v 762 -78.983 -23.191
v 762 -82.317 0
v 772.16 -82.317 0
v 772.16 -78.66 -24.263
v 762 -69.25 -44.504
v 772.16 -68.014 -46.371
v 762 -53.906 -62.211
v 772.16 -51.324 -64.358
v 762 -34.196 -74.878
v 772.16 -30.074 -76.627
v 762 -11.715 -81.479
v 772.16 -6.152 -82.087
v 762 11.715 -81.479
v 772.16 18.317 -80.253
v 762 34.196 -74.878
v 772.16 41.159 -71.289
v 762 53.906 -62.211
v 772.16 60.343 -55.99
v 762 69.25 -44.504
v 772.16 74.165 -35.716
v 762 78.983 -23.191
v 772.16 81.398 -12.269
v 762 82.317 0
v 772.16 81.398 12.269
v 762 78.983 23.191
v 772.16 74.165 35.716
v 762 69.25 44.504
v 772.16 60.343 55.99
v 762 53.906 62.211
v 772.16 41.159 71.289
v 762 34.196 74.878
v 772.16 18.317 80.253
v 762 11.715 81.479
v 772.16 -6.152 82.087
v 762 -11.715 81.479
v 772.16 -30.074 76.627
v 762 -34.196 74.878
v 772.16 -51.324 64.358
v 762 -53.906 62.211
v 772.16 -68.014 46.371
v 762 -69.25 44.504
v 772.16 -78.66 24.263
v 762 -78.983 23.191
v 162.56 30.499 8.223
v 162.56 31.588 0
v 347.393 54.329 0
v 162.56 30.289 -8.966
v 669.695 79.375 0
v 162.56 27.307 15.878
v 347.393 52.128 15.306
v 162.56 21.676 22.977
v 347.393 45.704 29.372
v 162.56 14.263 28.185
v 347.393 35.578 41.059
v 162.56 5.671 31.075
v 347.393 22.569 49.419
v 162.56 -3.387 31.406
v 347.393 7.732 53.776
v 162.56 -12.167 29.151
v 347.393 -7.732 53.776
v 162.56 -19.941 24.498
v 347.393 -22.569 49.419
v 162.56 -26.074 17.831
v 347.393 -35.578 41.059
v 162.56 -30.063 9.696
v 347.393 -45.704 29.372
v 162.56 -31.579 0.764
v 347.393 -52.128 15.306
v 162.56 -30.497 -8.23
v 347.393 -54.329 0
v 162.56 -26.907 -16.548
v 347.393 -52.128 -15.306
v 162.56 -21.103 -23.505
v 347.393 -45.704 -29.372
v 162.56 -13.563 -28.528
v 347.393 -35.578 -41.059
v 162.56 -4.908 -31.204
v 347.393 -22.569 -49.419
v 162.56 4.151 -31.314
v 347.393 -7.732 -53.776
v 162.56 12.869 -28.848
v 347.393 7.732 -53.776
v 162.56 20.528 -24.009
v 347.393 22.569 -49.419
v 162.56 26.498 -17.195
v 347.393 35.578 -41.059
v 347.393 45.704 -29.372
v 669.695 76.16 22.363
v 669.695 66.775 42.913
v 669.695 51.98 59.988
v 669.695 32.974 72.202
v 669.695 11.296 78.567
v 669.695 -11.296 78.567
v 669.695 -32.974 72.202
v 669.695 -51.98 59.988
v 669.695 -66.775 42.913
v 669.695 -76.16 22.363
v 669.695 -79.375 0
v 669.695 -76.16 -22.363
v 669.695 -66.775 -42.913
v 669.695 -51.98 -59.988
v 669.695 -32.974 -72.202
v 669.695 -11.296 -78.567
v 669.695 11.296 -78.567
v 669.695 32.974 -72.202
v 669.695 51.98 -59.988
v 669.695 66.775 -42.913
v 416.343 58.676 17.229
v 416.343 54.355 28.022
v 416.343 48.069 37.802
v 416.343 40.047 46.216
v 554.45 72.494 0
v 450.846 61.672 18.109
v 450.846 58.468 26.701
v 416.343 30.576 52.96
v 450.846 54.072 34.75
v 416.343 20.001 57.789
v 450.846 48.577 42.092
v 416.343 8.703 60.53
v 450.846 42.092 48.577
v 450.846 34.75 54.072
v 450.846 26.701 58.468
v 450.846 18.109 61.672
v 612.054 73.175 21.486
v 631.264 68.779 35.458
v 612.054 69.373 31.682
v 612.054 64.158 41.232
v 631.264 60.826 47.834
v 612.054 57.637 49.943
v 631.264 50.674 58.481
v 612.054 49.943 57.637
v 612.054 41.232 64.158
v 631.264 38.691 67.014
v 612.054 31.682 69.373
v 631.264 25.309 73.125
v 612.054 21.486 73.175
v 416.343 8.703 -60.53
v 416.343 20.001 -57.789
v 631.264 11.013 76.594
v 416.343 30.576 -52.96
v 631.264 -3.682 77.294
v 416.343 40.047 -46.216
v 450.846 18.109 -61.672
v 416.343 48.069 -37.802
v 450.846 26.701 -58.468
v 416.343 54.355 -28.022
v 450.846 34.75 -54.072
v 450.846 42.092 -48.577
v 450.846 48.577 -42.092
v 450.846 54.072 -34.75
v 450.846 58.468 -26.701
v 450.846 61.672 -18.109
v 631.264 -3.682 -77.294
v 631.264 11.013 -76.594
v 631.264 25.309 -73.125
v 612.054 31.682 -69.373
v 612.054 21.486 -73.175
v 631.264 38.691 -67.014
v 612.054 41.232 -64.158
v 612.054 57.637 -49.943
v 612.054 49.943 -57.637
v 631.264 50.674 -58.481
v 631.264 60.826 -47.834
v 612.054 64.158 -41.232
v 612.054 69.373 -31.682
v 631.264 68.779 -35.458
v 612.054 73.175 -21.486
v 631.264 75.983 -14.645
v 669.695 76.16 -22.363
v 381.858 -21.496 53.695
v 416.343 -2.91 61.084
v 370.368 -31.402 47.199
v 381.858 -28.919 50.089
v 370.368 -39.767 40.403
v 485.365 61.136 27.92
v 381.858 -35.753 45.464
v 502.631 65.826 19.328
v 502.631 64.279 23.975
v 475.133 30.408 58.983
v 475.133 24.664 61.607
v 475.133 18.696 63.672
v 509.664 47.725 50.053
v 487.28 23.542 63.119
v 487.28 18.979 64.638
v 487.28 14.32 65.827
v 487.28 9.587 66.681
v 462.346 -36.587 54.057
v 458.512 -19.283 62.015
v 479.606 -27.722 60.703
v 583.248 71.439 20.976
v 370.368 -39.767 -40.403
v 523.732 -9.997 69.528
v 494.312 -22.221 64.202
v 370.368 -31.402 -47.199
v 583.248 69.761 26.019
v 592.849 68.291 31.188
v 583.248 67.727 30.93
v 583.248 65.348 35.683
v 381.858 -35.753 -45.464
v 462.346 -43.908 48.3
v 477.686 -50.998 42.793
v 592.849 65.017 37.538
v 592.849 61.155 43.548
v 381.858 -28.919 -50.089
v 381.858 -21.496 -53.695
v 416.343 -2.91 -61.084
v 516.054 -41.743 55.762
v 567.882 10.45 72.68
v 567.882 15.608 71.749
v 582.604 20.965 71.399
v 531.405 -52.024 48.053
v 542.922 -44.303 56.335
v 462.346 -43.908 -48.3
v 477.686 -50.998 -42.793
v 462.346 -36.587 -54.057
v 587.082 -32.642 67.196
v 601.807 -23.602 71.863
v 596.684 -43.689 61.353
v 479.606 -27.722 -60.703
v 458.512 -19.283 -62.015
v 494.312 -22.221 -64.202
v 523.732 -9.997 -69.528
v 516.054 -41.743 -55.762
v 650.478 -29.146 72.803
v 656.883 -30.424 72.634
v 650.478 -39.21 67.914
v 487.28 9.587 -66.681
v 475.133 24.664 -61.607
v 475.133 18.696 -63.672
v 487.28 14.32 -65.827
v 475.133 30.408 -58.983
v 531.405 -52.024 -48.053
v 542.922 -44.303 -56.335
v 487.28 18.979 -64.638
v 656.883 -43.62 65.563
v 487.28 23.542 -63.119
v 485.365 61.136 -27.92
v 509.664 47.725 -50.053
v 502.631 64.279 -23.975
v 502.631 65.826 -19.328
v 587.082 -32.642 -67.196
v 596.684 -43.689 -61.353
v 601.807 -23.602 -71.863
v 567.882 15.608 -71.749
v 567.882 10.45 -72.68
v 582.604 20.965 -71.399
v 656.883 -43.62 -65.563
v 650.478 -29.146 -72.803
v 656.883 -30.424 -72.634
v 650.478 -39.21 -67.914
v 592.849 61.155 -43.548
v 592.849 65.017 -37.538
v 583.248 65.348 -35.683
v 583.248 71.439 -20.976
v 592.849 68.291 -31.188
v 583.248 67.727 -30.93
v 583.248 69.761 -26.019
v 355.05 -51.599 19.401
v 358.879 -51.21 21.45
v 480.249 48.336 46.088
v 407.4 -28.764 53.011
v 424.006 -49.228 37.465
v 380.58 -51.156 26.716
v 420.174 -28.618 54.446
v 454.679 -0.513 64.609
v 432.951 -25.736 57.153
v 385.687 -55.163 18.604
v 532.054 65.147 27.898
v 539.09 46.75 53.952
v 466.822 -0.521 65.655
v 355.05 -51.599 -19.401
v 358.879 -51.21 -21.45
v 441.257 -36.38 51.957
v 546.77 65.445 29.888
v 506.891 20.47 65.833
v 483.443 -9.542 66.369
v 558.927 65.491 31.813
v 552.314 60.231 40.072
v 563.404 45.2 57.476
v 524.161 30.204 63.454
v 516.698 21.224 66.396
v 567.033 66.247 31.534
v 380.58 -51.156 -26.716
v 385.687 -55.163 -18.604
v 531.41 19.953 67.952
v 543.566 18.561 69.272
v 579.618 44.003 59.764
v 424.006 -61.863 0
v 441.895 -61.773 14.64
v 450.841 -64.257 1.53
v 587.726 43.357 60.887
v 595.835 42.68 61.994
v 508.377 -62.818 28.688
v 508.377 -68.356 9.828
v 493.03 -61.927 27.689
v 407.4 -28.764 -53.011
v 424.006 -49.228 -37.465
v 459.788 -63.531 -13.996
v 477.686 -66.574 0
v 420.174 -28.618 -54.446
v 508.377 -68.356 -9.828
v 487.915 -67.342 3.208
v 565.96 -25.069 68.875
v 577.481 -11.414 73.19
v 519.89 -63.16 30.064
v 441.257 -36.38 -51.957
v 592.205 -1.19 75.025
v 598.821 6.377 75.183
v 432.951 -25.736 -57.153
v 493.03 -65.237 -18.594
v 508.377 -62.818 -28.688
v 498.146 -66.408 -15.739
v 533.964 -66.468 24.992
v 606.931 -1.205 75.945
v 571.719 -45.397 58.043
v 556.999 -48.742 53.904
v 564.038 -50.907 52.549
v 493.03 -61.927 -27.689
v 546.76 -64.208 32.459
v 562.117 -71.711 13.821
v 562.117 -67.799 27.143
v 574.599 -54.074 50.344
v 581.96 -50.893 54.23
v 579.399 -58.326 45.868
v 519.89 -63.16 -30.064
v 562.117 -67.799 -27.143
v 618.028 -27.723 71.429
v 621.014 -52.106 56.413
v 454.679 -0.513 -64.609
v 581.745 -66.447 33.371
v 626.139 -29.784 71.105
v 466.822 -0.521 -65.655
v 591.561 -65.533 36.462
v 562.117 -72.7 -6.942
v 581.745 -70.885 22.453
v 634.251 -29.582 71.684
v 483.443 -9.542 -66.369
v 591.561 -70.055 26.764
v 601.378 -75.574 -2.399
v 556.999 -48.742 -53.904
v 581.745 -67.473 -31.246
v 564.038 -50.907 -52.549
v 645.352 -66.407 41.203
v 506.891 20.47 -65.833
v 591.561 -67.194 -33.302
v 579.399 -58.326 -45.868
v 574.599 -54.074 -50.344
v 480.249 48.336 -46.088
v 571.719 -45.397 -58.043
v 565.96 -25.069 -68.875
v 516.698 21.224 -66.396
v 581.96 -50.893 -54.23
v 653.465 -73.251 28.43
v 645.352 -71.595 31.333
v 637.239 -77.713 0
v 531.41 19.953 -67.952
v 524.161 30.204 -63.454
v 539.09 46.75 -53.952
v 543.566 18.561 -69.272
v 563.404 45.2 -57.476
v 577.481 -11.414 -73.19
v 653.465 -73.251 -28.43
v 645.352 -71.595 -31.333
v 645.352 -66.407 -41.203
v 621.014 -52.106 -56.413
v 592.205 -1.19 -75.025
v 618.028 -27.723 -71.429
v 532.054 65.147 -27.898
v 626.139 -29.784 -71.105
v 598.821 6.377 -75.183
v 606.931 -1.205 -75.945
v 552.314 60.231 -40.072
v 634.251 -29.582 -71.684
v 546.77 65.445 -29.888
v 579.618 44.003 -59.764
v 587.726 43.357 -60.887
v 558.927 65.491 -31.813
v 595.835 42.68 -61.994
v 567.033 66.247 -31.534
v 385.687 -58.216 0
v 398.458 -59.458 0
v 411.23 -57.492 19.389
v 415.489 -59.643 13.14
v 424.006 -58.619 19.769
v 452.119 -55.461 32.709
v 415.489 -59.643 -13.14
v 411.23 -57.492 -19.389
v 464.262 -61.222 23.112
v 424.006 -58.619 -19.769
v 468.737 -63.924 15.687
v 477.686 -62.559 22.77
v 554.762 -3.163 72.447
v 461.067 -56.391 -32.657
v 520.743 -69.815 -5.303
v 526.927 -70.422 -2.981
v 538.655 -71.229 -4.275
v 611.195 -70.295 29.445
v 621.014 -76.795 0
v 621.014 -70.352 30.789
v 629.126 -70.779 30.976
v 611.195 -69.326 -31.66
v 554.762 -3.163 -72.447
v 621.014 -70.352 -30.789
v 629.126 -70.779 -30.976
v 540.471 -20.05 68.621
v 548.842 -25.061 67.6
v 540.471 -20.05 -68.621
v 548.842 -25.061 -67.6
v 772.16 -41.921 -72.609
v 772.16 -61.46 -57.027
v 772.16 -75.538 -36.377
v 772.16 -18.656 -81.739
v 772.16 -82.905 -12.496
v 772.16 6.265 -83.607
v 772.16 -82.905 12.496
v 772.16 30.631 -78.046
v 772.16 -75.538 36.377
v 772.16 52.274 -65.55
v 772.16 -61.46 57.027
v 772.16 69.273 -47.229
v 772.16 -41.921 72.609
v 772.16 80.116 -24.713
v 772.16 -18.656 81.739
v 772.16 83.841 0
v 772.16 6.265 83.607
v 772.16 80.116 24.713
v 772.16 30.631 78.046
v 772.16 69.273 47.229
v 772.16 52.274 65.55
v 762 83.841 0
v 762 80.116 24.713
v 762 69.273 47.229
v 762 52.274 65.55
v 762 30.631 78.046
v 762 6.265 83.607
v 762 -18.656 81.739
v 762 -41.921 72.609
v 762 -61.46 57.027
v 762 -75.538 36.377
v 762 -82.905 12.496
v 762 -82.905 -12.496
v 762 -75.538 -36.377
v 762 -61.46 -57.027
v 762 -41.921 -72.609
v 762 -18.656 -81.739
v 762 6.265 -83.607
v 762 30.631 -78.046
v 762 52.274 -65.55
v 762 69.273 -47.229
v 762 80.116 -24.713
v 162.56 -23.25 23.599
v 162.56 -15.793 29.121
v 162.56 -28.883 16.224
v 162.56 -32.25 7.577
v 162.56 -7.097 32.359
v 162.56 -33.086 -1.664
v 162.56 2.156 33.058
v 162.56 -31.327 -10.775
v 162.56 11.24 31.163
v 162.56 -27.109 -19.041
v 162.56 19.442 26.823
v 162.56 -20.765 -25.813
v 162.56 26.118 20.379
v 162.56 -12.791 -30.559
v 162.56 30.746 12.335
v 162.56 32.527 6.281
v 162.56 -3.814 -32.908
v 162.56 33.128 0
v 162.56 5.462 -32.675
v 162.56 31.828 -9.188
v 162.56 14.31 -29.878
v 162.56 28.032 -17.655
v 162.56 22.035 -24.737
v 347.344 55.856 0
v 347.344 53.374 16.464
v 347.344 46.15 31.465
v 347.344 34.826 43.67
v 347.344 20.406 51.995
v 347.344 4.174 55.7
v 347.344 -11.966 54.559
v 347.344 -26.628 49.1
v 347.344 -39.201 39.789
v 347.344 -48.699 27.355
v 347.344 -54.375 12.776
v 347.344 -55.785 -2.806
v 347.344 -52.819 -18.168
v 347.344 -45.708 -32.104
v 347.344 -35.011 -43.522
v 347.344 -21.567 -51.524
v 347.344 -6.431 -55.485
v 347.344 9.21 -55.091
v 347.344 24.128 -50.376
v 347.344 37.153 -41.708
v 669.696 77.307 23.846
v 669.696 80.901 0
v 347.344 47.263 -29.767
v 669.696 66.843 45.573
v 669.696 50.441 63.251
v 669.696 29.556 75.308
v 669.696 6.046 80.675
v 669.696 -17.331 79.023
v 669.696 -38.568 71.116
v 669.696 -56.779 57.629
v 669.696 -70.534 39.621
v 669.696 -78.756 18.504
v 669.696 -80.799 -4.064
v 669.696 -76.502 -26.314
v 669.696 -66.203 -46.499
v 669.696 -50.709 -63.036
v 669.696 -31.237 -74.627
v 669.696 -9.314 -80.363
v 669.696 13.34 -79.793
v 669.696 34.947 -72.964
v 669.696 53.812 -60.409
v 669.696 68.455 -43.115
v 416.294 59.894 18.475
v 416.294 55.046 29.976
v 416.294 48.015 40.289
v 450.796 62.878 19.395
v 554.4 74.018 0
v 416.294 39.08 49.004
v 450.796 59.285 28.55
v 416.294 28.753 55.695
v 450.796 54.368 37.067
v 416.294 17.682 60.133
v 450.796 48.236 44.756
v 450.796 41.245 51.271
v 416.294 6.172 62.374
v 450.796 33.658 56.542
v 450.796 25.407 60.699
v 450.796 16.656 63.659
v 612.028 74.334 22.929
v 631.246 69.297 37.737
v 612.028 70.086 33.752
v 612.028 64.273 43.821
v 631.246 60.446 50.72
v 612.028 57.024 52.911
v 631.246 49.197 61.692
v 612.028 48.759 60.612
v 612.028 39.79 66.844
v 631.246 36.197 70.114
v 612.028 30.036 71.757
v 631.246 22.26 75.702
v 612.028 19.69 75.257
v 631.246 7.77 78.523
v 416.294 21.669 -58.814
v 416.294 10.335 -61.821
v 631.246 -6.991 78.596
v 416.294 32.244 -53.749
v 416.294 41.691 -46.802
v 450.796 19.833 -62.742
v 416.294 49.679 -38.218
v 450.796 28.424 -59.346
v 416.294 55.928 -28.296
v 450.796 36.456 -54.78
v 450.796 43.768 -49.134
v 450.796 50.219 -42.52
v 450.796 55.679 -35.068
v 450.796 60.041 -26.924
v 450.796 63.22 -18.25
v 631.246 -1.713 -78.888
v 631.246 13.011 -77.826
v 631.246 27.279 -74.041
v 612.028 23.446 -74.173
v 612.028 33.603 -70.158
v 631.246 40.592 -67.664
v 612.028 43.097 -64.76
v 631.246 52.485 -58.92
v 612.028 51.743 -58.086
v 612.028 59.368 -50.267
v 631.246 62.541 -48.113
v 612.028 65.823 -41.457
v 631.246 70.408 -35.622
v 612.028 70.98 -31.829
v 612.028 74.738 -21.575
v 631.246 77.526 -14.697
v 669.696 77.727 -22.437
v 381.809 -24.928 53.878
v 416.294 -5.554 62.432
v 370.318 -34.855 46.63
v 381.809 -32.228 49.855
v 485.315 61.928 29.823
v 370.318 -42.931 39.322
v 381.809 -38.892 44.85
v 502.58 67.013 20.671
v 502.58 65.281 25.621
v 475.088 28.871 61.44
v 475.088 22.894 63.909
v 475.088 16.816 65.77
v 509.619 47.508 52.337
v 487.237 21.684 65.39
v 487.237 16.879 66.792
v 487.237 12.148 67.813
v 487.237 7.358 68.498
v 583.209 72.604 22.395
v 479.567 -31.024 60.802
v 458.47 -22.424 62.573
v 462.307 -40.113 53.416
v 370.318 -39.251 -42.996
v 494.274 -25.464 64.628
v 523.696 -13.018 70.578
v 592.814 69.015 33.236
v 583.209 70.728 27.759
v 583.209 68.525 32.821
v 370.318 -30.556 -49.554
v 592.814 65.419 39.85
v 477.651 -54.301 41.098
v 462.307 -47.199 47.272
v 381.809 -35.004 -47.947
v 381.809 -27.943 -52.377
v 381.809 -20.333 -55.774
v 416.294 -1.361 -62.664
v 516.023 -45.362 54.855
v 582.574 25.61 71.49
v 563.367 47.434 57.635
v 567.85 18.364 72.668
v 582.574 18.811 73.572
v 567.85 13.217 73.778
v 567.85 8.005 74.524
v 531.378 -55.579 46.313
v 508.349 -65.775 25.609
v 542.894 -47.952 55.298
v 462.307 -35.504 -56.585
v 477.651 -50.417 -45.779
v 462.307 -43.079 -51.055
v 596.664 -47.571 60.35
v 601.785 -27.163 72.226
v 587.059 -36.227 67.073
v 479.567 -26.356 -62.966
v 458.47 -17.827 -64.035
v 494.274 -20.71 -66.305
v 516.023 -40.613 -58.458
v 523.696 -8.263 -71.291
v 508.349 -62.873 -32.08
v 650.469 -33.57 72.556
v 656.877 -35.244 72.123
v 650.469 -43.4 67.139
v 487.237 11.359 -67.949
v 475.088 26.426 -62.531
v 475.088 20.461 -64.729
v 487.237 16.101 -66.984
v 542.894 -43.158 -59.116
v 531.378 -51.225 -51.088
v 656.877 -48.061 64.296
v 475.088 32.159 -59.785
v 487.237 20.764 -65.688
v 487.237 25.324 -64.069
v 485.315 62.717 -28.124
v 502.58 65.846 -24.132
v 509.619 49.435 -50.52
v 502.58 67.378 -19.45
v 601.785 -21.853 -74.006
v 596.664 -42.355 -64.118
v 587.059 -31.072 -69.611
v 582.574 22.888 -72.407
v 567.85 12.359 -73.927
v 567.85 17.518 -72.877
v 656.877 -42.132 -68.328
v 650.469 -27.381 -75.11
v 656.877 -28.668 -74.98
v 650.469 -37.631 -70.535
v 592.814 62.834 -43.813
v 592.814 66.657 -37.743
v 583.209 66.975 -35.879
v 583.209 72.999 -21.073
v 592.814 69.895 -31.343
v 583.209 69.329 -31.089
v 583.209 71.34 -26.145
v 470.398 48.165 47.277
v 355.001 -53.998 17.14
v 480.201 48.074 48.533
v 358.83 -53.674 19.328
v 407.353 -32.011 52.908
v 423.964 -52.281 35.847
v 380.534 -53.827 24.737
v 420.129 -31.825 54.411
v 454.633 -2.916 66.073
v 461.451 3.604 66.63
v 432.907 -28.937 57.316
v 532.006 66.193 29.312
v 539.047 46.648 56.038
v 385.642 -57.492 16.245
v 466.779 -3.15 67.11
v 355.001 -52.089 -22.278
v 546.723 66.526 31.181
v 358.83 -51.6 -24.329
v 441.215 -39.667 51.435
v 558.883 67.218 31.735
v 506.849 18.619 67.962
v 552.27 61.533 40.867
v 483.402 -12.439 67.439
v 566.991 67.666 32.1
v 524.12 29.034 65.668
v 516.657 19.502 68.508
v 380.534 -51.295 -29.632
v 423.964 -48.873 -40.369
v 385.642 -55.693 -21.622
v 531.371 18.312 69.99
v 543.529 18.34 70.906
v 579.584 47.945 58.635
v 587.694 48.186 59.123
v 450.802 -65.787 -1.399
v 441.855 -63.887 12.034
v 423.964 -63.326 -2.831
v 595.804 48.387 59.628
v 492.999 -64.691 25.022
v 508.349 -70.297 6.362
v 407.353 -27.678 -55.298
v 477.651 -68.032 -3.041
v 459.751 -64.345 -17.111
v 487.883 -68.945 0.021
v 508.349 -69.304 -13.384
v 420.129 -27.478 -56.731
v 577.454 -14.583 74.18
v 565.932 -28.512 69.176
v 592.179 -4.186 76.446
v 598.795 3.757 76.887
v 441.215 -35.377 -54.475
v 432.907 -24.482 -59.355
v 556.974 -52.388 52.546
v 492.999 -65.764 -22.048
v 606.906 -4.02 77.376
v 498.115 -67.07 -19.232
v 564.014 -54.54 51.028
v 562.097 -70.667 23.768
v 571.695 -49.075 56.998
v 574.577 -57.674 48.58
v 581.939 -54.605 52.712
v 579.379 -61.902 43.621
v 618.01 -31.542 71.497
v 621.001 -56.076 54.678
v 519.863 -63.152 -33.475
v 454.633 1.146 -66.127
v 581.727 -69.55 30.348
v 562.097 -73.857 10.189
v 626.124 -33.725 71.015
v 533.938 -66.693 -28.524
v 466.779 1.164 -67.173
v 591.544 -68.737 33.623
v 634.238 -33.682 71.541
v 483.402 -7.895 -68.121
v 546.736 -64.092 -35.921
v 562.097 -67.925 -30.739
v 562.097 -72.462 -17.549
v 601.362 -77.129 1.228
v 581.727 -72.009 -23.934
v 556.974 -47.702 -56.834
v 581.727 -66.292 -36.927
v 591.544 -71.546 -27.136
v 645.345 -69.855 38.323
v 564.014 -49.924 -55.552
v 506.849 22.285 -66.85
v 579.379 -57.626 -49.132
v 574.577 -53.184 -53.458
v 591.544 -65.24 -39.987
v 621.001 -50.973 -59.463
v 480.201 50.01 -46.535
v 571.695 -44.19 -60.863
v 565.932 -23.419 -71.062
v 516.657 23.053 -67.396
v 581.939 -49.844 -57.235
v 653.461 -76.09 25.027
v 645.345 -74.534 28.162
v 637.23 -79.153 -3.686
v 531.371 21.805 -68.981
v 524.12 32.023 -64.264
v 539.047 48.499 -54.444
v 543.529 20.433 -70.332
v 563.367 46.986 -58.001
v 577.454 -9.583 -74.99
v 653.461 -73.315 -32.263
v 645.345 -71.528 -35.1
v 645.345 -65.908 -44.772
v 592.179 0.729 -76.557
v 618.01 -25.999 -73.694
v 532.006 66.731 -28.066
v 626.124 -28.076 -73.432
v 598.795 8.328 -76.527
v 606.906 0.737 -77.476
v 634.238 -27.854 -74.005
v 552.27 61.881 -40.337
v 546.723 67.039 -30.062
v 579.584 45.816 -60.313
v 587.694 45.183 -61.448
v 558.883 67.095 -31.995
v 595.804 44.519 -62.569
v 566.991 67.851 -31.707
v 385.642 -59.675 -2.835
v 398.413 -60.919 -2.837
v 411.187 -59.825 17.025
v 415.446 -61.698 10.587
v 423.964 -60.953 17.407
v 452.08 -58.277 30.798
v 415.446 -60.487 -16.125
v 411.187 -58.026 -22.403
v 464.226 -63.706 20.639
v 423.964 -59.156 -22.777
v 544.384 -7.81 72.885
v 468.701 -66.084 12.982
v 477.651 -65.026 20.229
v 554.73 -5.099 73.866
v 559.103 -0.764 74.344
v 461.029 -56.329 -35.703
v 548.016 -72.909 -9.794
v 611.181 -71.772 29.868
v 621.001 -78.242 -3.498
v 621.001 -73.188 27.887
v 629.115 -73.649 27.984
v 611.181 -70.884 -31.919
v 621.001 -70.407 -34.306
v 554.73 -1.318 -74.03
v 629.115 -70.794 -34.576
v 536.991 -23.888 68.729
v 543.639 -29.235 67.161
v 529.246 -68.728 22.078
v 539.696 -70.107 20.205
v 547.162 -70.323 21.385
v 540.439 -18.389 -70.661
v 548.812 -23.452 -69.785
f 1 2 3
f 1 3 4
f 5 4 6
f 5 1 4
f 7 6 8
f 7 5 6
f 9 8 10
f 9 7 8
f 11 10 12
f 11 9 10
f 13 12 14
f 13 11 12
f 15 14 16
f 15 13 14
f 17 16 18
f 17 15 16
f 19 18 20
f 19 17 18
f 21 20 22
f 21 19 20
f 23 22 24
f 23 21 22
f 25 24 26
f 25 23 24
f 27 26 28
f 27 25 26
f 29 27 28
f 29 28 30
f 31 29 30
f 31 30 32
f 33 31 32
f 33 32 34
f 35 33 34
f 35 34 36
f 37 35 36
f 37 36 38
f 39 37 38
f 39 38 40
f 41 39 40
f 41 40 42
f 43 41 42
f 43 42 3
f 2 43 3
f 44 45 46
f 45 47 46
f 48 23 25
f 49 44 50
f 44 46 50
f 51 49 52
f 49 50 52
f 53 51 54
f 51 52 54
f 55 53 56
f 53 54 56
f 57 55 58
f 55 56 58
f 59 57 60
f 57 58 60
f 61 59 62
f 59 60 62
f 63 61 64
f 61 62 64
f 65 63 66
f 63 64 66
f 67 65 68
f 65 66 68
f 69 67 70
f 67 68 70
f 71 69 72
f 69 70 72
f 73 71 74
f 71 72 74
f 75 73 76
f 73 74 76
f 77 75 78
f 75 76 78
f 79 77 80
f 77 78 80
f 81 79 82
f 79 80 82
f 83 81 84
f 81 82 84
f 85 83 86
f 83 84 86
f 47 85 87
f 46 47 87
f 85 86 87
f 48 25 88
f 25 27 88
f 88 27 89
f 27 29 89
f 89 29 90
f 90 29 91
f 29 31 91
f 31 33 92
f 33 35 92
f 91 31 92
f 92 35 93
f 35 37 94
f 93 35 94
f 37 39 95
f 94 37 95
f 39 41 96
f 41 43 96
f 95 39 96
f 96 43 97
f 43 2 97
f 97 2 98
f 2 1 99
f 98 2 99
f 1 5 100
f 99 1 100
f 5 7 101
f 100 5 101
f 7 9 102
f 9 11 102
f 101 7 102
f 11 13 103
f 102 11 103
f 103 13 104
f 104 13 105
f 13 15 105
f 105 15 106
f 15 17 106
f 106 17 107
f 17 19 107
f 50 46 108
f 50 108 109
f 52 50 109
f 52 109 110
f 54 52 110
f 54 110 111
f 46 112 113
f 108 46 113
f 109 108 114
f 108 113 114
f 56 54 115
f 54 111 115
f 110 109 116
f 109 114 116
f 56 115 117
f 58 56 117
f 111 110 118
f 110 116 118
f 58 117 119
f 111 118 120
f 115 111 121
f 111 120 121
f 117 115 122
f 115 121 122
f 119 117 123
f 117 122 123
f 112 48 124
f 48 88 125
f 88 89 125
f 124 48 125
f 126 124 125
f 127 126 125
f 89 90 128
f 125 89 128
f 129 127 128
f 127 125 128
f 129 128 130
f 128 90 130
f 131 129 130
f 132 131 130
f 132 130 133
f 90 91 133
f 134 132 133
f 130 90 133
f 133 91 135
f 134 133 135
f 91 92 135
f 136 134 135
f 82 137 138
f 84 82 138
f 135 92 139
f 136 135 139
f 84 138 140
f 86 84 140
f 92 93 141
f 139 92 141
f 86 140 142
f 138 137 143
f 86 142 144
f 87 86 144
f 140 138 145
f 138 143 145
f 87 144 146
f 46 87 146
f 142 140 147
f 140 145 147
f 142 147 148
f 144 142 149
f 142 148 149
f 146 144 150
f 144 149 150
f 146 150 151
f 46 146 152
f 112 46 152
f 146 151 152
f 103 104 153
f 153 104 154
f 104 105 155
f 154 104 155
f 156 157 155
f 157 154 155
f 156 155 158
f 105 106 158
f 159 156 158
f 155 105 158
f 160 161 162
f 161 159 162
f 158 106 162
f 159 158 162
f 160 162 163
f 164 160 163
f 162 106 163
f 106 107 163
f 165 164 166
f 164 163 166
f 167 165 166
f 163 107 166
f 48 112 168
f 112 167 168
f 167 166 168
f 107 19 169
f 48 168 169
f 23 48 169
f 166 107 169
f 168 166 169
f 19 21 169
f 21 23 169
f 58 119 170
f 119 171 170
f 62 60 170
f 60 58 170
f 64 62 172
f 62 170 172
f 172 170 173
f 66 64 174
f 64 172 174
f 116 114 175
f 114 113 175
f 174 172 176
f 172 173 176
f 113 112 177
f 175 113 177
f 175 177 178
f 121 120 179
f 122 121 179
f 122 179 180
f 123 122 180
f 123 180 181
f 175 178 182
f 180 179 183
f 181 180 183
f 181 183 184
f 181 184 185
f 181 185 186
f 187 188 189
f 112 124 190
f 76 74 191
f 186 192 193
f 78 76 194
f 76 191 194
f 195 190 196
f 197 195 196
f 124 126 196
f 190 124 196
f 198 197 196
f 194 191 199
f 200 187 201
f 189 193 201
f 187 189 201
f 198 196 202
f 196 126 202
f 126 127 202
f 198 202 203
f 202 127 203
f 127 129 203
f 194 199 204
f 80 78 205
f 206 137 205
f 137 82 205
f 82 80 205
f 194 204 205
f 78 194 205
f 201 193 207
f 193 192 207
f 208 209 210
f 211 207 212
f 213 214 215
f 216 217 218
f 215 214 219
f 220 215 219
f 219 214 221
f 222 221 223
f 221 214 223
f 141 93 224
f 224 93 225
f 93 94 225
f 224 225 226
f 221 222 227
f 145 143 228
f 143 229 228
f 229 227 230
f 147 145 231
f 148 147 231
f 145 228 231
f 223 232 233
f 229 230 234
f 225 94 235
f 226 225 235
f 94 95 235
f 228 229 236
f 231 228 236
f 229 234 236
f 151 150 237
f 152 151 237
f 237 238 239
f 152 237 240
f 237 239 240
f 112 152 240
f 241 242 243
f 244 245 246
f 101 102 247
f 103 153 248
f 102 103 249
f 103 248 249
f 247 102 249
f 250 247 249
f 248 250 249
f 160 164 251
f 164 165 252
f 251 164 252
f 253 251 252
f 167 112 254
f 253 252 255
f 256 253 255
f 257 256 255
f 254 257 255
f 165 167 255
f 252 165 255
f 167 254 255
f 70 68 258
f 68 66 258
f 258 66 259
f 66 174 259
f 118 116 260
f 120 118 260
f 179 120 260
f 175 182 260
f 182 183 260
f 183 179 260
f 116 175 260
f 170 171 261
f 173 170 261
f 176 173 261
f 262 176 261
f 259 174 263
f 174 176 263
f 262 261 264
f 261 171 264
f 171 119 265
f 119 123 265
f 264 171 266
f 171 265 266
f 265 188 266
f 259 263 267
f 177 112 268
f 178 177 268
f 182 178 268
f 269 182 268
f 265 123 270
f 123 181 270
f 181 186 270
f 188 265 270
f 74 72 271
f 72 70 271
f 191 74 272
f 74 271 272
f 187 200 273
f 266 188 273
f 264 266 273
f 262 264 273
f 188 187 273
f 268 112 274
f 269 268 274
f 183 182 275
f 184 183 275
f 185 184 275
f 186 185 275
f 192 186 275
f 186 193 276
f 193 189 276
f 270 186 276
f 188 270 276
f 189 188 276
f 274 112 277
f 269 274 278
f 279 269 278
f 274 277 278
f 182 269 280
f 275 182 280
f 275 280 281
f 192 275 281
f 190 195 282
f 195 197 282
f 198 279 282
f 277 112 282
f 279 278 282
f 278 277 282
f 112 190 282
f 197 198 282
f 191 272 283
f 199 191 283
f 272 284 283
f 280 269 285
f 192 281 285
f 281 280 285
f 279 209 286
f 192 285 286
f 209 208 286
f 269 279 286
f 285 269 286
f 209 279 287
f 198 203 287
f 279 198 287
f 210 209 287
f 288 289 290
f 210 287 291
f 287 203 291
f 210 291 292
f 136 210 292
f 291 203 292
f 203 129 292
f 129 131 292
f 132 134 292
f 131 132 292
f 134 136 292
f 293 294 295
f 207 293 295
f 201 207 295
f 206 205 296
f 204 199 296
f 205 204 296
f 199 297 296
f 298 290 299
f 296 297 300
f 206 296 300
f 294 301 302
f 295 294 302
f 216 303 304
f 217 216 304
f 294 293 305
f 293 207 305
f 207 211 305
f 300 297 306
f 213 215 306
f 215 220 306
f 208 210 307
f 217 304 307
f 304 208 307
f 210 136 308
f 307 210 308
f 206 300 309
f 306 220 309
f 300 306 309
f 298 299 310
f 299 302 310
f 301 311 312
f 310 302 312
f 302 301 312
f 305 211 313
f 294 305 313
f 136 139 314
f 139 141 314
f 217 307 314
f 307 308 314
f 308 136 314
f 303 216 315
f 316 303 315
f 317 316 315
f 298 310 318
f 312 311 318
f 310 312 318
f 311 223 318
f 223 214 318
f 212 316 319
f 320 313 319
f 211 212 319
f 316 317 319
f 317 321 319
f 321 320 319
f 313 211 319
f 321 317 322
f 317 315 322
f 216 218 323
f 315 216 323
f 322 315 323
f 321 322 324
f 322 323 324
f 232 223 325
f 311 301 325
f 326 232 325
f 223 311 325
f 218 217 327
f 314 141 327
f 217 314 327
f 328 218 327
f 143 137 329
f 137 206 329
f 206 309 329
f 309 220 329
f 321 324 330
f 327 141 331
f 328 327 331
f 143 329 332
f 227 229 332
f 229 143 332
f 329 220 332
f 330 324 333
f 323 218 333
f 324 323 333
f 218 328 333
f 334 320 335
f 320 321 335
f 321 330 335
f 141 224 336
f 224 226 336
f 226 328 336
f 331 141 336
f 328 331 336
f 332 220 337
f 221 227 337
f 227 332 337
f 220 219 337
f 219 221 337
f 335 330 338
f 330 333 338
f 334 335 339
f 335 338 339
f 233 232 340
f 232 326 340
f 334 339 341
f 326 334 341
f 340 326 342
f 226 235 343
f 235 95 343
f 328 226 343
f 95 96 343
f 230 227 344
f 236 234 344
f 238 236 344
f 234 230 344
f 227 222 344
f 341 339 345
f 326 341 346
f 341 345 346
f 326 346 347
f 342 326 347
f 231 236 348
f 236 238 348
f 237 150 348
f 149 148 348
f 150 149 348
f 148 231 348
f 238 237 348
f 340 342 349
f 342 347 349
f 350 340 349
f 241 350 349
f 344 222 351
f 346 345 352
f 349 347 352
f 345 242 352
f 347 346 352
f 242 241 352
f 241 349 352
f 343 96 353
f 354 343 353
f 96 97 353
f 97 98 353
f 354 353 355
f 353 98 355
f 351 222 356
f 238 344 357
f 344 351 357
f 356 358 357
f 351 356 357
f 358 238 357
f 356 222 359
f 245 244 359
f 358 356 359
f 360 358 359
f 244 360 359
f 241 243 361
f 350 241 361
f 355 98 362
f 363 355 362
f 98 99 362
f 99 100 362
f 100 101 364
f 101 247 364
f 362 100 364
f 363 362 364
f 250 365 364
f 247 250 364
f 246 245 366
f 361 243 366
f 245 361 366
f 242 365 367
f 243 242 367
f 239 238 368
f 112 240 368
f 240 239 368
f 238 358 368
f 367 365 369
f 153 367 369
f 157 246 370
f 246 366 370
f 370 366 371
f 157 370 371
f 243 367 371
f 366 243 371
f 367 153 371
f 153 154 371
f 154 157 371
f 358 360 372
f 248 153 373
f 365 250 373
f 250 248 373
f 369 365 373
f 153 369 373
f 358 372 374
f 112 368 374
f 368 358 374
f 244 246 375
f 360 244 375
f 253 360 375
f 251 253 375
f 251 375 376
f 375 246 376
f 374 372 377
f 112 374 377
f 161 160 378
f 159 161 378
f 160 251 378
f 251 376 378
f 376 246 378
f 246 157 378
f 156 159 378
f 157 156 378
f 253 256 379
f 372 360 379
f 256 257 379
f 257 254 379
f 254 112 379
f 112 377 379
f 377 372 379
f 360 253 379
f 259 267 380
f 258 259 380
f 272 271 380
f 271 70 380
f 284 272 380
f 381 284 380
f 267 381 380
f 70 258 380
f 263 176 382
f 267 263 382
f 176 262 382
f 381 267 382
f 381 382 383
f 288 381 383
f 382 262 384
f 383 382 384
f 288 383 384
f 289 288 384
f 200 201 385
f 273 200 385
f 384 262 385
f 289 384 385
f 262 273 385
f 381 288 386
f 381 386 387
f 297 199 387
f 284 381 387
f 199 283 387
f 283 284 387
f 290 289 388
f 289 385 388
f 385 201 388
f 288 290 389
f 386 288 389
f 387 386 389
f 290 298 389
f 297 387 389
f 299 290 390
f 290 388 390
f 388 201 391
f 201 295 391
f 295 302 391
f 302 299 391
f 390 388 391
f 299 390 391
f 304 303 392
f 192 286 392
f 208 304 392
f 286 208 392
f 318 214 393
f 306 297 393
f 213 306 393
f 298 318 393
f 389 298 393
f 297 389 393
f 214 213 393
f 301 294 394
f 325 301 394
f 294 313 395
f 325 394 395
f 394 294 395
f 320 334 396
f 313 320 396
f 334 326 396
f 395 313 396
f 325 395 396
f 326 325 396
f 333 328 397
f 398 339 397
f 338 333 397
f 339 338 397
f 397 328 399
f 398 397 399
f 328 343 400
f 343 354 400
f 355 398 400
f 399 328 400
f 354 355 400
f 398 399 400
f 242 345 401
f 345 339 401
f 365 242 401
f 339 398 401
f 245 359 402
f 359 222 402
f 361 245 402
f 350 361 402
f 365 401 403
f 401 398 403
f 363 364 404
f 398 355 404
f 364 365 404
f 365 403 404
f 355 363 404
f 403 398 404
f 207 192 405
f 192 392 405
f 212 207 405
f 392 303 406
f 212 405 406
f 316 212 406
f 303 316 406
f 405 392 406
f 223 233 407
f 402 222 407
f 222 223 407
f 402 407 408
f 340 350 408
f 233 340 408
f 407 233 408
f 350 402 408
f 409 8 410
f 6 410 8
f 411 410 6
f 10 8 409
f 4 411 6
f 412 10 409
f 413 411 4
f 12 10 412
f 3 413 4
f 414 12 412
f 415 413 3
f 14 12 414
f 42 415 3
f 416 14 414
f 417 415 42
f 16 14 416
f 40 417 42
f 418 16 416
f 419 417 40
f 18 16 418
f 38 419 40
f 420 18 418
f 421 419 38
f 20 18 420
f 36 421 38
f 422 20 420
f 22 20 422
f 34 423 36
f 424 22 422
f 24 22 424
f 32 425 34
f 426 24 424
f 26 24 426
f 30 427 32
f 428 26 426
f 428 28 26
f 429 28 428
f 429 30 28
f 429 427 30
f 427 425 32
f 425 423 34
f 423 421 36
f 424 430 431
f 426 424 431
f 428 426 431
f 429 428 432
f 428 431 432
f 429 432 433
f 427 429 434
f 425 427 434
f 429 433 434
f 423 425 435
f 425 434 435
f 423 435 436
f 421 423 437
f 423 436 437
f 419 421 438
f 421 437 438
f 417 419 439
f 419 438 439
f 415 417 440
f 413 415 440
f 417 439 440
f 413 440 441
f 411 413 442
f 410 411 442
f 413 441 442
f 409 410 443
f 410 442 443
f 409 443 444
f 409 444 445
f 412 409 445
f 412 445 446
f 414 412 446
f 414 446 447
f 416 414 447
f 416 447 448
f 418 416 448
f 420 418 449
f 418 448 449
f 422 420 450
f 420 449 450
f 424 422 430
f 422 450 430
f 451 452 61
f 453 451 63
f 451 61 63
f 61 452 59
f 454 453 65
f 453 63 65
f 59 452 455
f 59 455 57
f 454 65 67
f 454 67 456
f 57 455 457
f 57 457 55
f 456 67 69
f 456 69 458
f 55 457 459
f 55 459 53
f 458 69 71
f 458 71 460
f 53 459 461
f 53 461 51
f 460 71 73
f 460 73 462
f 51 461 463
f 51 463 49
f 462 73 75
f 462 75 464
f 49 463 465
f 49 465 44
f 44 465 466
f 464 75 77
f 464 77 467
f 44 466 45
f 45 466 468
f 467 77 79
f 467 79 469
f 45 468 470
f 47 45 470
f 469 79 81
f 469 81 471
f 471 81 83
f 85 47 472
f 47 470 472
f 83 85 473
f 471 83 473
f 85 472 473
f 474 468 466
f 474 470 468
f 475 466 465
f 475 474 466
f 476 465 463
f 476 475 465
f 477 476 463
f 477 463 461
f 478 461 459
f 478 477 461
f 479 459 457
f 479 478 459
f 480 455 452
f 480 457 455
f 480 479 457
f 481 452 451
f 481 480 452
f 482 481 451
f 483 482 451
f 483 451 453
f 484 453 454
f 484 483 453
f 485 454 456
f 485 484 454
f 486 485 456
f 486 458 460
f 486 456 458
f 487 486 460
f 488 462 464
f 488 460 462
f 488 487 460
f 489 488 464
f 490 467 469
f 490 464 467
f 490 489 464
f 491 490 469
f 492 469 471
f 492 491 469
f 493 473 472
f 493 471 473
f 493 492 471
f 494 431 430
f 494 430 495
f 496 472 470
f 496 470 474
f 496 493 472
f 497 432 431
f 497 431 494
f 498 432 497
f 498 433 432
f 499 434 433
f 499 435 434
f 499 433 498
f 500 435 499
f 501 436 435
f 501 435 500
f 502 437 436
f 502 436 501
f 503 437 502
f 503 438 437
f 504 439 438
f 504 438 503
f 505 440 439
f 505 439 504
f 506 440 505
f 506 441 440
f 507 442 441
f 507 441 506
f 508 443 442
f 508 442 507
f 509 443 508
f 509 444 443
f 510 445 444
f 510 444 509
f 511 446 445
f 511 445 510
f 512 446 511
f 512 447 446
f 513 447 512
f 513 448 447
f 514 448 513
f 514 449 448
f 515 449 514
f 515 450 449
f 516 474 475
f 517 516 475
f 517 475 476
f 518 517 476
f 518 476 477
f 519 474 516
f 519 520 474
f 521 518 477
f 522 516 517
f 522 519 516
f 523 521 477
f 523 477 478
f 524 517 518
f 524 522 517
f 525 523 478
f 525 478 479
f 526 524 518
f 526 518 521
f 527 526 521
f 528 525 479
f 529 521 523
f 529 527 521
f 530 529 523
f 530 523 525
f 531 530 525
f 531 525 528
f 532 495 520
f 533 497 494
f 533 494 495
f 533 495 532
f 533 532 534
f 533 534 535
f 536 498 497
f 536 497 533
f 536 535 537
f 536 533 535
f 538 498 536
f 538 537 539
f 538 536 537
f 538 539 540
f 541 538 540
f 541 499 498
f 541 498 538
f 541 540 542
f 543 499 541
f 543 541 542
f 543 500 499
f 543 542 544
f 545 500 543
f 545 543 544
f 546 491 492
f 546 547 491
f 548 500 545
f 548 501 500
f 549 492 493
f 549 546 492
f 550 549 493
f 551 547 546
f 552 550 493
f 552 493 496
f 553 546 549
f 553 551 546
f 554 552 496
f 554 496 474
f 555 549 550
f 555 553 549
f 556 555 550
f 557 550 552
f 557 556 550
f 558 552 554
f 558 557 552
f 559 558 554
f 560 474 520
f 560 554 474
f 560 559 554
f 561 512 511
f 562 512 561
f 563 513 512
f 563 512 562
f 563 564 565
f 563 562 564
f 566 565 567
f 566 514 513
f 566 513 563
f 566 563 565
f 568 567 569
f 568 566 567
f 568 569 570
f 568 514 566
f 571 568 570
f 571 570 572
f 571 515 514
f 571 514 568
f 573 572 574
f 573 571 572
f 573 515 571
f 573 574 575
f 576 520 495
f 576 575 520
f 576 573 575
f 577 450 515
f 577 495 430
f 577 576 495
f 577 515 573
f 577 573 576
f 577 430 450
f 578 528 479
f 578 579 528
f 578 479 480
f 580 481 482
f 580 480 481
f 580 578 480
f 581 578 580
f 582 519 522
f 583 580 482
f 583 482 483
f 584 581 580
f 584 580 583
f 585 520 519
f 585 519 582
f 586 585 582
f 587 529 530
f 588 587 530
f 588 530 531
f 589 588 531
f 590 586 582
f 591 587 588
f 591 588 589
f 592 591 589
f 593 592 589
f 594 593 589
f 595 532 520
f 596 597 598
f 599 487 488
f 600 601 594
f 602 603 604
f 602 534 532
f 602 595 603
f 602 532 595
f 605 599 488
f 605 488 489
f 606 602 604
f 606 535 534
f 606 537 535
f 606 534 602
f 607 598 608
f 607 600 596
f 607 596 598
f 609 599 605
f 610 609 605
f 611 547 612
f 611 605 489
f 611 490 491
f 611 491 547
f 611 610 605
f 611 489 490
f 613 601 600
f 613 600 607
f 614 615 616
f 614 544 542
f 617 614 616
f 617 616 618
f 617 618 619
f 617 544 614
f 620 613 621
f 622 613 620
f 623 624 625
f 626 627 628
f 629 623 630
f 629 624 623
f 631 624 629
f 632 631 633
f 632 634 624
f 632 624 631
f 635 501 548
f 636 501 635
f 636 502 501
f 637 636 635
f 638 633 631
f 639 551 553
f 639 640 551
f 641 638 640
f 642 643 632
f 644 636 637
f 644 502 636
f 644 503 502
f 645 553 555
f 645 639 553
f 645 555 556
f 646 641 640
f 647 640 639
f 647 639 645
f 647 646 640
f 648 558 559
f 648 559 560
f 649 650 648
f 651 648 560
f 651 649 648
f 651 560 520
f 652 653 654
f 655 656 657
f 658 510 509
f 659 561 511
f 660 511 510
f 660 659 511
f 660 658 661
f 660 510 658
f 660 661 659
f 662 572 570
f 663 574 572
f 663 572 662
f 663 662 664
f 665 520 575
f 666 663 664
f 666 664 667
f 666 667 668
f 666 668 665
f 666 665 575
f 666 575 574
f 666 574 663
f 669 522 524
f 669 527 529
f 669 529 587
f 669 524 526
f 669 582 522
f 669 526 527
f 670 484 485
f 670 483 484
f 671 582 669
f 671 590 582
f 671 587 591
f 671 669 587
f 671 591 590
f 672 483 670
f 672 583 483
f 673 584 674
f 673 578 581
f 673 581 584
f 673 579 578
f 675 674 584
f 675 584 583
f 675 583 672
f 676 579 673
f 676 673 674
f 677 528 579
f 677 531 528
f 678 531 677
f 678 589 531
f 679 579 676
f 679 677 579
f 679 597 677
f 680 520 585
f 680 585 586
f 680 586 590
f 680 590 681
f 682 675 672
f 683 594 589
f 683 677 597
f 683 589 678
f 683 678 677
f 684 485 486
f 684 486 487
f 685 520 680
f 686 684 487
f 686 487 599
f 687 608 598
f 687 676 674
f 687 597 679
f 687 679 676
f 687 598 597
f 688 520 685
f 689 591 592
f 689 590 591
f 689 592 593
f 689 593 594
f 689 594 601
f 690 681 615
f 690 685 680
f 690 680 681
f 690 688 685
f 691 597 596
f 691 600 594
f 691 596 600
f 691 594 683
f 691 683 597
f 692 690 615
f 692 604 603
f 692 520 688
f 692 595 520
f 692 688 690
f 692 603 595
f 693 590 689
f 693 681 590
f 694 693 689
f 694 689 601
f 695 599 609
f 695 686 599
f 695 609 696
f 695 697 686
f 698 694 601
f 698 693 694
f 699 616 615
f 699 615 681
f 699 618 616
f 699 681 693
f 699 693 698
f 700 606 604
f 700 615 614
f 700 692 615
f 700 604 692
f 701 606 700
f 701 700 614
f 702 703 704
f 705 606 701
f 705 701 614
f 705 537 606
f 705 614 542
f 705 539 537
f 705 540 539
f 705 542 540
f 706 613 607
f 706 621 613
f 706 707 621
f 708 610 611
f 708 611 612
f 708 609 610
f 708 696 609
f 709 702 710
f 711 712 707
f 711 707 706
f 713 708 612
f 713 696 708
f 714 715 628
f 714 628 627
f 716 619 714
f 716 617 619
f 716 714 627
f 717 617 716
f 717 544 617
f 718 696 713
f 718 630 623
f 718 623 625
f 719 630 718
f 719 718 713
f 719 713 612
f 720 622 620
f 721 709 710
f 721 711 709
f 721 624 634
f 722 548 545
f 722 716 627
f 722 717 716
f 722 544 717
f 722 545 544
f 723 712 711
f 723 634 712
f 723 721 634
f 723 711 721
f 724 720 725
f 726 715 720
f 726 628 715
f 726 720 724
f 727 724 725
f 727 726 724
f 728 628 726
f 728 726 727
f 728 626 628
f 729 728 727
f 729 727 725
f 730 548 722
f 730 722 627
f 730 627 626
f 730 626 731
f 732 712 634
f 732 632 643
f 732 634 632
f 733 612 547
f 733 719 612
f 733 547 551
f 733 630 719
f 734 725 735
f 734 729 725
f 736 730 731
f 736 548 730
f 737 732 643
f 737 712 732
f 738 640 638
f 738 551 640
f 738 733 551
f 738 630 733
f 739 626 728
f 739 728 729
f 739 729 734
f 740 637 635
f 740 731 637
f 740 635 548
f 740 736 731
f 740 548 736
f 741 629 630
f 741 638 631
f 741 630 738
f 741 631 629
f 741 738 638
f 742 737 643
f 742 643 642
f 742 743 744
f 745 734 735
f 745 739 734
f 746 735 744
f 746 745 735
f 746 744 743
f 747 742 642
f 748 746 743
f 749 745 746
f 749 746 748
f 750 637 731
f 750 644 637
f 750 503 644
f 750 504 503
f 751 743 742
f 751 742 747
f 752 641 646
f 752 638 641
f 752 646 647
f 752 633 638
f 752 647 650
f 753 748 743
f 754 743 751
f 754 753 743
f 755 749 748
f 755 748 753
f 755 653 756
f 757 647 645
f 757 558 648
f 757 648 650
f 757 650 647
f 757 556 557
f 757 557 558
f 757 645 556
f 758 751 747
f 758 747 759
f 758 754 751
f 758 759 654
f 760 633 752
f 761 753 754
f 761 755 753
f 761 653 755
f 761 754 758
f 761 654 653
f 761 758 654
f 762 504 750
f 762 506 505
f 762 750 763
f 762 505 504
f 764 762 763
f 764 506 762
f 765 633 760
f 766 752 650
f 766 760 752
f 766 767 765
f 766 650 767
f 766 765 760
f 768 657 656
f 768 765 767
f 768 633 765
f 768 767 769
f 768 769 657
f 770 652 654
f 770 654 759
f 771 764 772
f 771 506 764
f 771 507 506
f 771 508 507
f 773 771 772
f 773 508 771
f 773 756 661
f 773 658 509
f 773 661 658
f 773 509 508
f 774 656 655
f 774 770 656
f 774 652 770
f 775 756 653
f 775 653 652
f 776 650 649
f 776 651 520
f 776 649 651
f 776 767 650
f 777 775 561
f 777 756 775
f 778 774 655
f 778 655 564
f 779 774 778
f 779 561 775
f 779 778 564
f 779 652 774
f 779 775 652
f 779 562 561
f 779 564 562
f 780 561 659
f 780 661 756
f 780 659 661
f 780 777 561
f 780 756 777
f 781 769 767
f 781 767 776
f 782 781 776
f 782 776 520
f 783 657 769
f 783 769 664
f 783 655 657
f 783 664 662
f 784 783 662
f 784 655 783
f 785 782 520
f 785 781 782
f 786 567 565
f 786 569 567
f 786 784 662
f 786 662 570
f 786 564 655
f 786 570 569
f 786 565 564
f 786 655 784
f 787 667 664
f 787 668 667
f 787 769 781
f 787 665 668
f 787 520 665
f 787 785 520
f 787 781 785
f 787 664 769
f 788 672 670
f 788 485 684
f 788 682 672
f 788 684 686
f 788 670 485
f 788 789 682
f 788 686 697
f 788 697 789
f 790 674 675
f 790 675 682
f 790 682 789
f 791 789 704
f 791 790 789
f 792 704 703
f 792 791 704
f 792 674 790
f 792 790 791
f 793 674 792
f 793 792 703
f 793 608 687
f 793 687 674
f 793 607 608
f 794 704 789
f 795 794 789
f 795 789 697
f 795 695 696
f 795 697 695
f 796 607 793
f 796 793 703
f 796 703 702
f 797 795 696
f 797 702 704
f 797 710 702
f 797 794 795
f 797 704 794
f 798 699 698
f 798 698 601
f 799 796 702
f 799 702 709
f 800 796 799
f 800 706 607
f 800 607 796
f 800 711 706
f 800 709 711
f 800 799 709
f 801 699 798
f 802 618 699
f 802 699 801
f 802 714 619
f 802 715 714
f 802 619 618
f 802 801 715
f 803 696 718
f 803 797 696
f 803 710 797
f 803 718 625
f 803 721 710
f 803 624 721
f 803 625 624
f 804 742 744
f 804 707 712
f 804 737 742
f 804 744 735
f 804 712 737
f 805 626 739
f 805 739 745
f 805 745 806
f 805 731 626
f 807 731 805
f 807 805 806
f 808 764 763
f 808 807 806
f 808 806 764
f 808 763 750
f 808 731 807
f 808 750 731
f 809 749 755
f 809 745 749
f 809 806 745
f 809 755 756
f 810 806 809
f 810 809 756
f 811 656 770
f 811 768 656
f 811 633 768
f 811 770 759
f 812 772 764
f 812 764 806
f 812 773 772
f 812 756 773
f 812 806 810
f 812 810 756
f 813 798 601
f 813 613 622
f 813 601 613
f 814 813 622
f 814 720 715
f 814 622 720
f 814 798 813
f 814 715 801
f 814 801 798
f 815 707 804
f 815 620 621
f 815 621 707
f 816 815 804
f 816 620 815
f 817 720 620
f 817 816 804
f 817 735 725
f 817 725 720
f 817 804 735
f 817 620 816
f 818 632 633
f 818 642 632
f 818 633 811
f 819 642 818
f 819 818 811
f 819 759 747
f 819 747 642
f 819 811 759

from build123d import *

# Parameters (mm, degrees)
SKETCH8_R           = 83.841254666
SKETCH8_R_2         = 82.317249201
BOSS_EXTRUDE1_DEPTH = 10.16
SKETCH9_R           = 78.358924529
CUT_EXTRUDE1_DEPTH  = 187.96


with BuildPart() as part:
    # Sketch7 → Revolve3 (revolve)
    with BuildSketch(Plane.XY):
        with BuildLine():
            add(Edge.make_bspline(
                [(2.890004562, 0), (2.895382745, 0.002478586), (3.114731574, 0.103470328), (3.772189671, 0.394557939), (4.892593468, 0.849688542), (6.72155052, 1.53547194), (9.051268741, 2.333090251), (12.826018708, 3.522776414), (17.599278058, 4.890957749), (23.373563661, 6.413247874), (29.176516141, 7.846136382), (36.94300293, 9.663971784), (46.689062936, 11.798346486), (58.424874502, 14.197738172), (70.188922239, 16.473591194), (81.974602451, 18.6463018), (97.71264621, 21.42647714), (117.420654598, 24.716507147), (141.110859364, 28.429826036), (164.833348495, 31.946353837), (188.581698126, 35.293998221), (212.351621104, 38.492682711), (244.069560818, 42.577741353), (283.757517922, 47.375416088), (331.434490554, 52.701690304), (379.154862581, 57.632899759), (426.912731664, 62.191265335), (490.634576058, 67.782687664), (554.417145386, 72.64929345), (618.252364776, 76.709424177), (658.17025028, 78.866656722), (690.115671587, 80.31586406), (714.080440133, 81.240229409), (734.052133379, 81.850150654), (750.032605884, 82.191005794), (758.010055581, 82.306548561), (762, 82.317249201)],
                knots=[0.003470978, 0.003470978, 0.003470978, 0.003470978, 0.00349552, 0.004471529, 0.006423545, 0.008375562, 0.012279595, 0.016183628, 0.023991695, 0.031799761, 0.039607828, 0.047415894, 0.063032027, 0.07864816, 0.094264293, 0.109880426, 0.125496558, 0.156728824, 0.18796109, 0.219193356, 0.250425621, 0.281657887, 0.312890153, 0.375354685, 0.437819216, 0.500283748, 0.562748279, 0.625212811, 0.750141874, 0.812606405, 0.875070937, 0.906303203, 0.937535468, 0.968767734, 0.984383867, 0.999994686, 0.999994686, 0.999994686, 0.999994686], degree=3))
            Line((762, 82.317249201), (762, 83.841254666))
            add(Edge.make_bspline(
                [(0, 0), (0.002469036, 0.007698152), (0.00852038, 0.022545642), (0.025428785, 0.049911406), (0.065694849, 0.100096678), (0.127523873, 0.163176144), (0.212062429, 0.237272493), (0.332279694, 0.331578396), (0.47681638, 0.434147846), (0.646496772, 0.544815952), (0.841412681, 0.663024364), (1.126864222, 0.82633392), (1.572744504, 1.062892156), (2.33539055, 1.432268664), (3.710931738, 2.02979685), (6.154578127, 2.969838304), (10.668005752, 4.490267325), (18.999517068, 6.917303838), (33.385795617, 10.520869917), (58.214680344, 15.881727226), (92.501407111, 22.236378549), (134.347160824, 29.066892837), (181.232321928, 35.913847395), (228.199436648, 42.167572329), (275.229416109, 47.928683924), (322.309575865, 53.261898342), (369.432294544, 58.204857708), (416.591925172, 62.781349507), (463.784734462, 67.002125548), (511.007900045, 70.868414522), (558.259527802, 74.370378395), (605.538293137, 77.485800464), (646.930327879, 79.837294836), (682.425589554, 81.539197971), (710.863439026, 82.65535626), (729.852911101, 83.259007577), (745.309411706, 83.632760833), (754.846503834, 83.785926018), (759.61543609, 83.834878653), (762, 83.841254666)],
                knots=[0, 0, 0, 0, 0, 4.177e-05, 8.3539e-05, 0.000167079, 0.000334158, 0.000501236, 0.000668315, 0.000962463, 0.001256611, 0.001555846, 0.001855081, 0.002674694, 0.003884179, 0.005967022, 0.009661666, 0.016303633, 0.028675652, 0.051140007, 0.0868676, 0.148543873, 0.210220157, 0.271896443, 0.333572727, 0.395249011, 0.456925295, 0.518601581, 0.580277867, 0.641954151, 0.703630435, 0.765306721, 0.826983006, 0.888659291, 0.919497433, 0.950335576, 0.975167788, 0.987583894, 1, 1, 1, 1, 1], degree=4))
            Line((0, 0), (2.890004562, 0))
        make_face()
    revolve(axis=Axis((0, 0, 0), (1, 0, 0)))

    # Sketch8 → Boss-Extrude1 (add)
    with BuildSketch(Plane(origin=(762, 0, 0), x_dir=(0, 0, -1), z_dir=(1, 0, 0))):
        with Locations(Location((0, 0, 0), (0, 0, 90))):
            Circle(SKETCH8_R)
        with Locations(Location((0, 0, 0), (0, 0, 270))):
            Circle(SKETCH8_R_2, mode=Mode.SUBTRACT)
    extrude(amount=BOSS_EXTRUDE1_DEPTH)

    # Sketch9 → Cut-Extrude1 (cut)
    with BuildSketch(Plane(origin=(162.56, 0, 0), x_dir=(0, 0, -1), z_dir=(1, 0, 0))):
        Circle(SKETCH9_R)
    extrude(amount=-CUT_EXTRUDE1_DEPTH, mode=Mode.SUBTRACT)


solid = part.part
